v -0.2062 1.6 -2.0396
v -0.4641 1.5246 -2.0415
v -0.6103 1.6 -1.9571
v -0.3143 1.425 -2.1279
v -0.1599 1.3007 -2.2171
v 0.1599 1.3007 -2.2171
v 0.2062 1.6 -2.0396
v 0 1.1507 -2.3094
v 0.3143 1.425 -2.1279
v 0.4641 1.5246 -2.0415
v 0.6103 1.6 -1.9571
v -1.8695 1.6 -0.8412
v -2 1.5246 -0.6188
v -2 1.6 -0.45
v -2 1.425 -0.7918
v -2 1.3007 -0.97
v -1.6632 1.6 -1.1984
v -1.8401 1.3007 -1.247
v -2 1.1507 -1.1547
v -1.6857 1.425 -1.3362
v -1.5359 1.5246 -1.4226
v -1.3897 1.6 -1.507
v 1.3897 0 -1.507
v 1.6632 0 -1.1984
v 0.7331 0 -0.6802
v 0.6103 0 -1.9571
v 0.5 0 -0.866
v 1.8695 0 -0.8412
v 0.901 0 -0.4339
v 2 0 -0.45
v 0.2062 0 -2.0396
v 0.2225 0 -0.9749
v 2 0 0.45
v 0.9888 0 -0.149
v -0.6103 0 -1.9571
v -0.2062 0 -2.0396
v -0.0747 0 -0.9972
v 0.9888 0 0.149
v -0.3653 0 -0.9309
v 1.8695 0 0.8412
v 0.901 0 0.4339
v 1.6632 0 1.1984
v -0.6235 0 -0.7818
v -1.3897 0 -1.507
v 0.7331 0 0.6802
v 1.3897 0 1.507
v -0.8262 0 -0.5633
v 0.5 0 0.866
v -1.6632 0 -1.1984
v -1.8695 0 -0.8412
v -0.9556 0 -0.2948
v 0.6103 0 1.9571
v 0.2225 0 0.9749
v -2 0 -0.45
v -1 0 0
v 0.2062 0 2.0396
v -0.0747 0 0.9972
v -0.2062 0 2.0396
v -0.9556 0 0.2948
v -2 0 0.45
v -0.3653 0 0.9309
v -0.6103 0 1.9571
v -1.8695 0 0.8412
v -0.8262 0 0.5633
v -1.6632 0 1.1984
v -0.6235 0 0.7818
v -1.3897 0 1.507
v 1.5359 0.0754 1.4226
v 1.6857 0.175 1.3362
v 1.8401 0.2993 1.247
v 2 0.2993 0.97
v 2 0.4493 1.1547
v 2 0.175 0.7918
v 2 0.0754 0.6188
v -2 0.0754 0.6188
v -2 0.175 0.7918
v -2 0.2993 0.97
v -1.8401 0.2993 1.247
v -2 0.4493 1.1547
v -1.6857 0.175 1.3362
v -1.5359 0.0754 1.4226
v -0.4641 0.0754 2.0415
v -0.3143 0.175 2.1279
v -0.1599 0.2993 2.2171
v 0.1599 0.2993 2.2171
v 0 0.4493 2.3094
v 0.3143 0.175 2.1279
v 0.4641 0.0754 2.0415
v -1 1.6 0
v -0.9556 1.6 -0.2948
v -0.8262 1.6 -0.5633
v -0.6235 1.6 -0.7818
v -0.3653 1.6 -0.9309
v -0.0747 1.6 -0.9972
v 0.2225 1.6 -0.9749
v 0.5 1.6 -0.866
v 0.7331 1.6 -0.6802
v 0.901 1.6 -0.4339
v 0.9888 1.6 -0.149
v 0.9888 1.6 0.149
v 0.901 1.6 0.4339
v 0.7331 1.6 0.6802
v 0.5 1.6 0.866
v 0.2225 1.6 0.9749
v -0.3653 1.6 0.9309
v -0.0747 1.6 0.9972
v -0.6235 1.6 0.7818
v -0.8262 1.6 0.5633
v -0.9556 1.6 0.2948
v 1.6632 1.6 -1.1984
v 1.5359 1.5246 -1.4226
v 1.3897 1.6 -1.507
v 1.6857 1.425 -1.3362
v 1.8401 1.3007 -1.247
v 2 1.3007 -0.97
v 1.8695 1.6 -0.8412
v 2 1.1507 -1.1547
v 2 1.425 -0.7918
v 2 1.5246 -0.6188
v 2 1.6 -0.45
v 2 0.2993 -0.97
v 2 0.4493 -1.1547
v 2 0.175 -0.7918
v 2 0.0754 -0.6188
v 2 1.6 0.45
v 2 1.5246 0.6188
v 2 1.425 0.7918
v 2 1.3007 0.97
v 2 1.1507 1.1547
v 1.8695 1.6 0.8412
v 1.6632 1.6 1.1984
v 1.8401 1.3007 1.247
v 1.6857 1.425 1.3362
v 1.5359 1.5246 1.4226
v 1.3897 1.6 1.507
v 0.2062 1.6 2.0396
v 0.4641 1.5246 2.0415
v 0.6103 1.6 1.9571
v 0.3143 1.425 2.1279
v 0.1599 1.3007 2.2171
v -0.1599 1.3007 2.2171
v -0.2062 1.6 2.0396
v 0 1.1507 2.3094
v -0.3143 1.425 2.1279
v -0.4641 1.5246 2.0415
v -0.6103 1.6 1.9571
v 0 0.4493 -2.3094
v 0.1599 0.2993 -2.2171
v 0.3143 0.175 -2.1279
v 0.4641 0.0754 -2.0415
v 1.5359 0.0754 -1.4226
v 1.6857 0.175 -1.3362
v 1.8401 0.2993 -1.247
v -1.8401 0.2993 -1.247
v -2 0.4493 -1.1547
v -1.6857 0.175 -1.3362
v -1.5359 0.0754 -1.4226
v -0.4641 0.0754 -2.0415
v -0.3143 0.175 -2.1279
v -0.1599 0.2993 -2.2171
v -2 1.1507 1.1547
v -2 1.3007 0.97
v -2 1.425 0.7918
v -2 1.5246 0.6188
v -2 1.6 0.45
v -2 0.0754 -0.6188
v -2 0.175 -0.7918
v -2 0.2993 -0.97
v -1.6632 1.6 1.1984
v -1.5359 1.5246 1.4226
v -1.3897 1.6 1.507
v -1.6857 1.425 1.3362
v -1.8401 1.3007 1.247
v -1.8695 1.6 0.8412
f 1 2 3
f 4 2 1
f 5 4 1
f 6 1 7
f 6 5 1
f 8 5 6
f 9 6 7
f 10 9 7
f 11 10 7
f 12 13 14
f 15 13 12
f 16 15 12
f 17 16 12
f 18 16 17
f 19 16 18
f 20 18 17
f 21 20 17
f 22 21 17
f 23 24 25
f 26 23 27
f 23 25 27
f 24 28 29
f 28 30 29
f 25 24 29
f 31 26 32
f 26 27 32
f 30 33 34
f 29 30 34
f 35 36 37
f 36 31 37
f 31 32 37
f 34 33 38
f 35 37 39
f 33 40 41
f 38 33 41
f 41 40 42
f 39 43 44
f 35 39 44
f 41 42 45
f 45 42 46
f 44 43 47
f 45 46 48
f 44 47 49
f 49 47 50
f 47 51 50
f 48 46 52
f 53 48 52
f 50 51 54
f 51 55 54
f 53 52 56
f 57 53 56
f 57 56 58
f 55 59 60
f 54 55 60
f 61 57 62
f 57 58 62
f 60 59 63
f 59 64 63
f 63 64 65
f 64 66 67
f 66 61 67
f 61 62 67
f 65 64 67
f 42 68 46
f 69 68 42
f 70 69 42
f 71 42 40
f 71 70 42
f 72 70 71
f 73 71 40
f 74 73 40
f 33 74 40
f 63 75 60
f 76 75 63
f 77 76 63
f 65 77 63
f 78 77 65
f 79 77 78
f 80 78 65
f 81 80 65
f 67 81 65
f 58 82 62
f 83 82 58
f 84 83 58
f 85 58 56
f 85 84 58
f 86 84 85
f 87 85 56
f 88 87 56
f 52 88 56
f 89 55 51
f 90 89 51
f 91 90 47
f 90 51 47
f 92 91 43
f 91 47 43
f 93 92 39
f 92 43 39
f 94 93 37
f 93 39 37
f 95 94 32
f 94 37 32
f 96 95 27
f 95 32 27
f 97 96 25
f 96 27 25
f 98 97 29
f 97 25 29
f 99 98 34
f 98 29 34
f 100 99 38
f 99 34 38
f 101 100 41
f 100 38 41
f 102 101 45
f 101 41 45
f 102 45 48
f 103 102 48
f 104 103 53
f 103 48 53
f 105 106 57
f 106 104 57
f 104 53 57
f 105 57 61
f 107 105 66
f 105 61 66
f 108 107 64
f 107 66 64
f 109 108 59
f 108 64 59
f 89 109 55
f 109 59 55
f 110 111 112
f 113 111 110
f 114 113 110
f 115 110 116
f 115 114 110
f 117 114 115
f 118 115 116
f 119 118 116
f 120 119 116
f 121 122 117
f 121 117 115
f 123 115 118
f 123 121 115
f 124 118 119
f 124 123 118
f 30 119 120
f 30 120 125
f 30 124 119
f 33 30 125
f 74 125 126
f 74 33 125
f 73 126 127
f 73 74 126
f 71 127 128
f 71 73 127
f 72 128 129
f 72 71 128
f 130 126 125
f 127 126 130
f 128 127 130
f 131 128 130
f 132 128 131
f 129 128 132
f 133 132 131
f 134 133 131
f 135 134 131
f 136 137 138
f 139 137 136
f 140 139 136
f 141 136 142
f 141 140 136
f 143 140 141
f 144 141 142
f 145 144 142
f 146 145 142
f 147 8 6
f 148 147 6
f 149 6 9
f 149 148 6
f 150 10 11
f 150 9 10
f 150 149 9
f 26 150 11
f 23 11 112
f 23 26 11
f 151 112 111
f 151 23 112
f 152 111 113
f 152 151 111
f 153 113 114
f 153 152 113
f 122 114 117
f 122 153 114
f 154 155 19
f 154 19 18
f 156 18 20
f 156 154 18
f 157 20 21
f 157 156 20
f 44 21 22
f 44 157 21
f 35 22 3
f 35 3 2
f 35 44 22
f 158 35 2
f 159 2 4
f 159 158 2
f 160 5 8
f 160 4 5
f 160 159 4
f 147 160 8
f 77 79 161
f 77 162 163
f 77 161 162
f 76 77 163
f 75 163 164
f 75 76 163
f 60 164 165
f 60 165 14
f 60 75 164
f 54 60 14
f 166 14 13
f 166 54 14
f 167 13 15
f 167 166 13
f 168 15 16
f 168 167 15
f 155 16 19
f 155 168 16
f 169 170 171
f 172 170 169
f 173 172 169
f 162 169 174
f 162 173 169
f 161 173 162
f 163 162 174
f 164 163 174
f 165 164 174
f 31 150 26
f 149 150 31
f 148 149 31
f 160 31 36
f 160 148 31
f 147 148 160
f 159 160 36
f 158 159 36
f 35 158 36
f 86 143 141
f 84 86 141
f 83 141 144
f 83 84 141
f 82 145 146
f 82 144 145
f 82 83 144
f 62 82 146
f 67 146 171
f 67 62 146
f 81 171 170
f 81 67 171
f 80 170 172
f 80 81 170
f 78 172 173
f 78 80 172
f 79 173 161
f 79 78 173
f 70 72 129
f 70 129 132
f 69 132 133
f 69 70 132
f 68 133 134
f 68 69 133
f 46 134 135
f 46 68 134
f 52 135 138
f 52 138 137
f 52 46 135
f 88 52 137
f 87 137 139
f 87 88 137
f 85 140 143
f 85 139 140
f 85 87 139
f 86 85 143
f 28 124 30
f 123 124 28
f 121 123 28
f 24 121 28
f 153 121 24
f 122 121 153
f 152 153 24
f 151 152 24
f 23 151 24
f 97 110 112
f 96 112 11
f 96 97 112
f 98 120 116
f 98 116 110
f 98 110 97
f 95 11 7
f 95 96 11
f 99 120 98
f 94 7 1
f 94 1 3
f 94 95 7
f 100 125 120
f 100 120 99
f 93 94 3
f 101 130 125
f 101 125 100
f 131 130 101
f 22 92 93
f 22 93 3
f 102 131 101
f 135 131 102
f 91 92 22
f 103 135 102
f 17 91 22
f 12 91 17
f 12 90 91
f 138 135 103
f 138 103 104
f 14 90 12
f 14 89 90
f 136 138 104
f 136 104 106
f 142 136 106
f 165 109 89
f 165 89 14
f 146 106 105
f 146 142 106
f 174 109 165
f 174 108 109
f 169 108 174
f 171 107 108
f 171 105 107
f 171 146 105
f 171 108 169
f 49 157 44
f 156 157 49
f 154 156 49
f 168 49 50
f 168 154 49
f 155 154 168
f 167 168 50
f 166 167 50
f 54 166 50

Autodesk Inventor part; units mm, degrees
ref_plane "YZ Plane" through (0, 0, 0) normal (1, 0, 0) x (0, 1, 0)
ref_plane "XZ Plane" through (0, 0, 0) normal (0, 1, 0) x (-1, 0, 0)
ref_plane "XY Plane" through (0, 0, 0) normal (0, 0, 1) x (1, 0, 0)
sketch "Sketch1" plane through (0, 0, 0) normal (0, 1, 0) x (-1, 0, 0)
  line L0 (2, 1.1547) -> (2, -1.1547)
  line L1 (2, -1.1547) -> (0, -2.3094)
  line L2 (0, -2.3094) -> (-2, -1.1547)
  line L3 (-2, -1.1547) -> (-2, 1.1547)
  line L4 (-2, 1.1547) -> (0, 2.3094)
  line L5 (0, 2.3094) -> (2, 1.1547)
  circle A0 centre (0, 0) radius 1
  dimension "d0" = 4
  dimension "d1" = 2
extrude "Extrusion1" add sketch "Sketch1" along normal blind 1.6
thread "Thread1" size "M2x0.4" class "6H" standard "ISO Metric profile" length 11.5
sketch "Sketch2" plane through (0, 1.6, 0) normal (0, 1, 0) x (1, 0, 0)
  circle A0 centre (0, 0) radius 2.05
  dimension "d7" = 4.1
extrude "Extrusion2" cut sketch "Sketch2" against normal blind 1.6 draft 30 keep common part
sketch "Sketch3" plane through (0, 0, 0) normal (0, -1, 0) x (1, 0, 0)
  circle A0 centre (0, 0) radius 2.05
  dimension "d10" = 4.1
extrude "Extrusion3" cut sketch "Sketch3" against normal blind 1.6 draft 30 keep common part
properties part number "Nut_M2_Brass" material "Brass"
